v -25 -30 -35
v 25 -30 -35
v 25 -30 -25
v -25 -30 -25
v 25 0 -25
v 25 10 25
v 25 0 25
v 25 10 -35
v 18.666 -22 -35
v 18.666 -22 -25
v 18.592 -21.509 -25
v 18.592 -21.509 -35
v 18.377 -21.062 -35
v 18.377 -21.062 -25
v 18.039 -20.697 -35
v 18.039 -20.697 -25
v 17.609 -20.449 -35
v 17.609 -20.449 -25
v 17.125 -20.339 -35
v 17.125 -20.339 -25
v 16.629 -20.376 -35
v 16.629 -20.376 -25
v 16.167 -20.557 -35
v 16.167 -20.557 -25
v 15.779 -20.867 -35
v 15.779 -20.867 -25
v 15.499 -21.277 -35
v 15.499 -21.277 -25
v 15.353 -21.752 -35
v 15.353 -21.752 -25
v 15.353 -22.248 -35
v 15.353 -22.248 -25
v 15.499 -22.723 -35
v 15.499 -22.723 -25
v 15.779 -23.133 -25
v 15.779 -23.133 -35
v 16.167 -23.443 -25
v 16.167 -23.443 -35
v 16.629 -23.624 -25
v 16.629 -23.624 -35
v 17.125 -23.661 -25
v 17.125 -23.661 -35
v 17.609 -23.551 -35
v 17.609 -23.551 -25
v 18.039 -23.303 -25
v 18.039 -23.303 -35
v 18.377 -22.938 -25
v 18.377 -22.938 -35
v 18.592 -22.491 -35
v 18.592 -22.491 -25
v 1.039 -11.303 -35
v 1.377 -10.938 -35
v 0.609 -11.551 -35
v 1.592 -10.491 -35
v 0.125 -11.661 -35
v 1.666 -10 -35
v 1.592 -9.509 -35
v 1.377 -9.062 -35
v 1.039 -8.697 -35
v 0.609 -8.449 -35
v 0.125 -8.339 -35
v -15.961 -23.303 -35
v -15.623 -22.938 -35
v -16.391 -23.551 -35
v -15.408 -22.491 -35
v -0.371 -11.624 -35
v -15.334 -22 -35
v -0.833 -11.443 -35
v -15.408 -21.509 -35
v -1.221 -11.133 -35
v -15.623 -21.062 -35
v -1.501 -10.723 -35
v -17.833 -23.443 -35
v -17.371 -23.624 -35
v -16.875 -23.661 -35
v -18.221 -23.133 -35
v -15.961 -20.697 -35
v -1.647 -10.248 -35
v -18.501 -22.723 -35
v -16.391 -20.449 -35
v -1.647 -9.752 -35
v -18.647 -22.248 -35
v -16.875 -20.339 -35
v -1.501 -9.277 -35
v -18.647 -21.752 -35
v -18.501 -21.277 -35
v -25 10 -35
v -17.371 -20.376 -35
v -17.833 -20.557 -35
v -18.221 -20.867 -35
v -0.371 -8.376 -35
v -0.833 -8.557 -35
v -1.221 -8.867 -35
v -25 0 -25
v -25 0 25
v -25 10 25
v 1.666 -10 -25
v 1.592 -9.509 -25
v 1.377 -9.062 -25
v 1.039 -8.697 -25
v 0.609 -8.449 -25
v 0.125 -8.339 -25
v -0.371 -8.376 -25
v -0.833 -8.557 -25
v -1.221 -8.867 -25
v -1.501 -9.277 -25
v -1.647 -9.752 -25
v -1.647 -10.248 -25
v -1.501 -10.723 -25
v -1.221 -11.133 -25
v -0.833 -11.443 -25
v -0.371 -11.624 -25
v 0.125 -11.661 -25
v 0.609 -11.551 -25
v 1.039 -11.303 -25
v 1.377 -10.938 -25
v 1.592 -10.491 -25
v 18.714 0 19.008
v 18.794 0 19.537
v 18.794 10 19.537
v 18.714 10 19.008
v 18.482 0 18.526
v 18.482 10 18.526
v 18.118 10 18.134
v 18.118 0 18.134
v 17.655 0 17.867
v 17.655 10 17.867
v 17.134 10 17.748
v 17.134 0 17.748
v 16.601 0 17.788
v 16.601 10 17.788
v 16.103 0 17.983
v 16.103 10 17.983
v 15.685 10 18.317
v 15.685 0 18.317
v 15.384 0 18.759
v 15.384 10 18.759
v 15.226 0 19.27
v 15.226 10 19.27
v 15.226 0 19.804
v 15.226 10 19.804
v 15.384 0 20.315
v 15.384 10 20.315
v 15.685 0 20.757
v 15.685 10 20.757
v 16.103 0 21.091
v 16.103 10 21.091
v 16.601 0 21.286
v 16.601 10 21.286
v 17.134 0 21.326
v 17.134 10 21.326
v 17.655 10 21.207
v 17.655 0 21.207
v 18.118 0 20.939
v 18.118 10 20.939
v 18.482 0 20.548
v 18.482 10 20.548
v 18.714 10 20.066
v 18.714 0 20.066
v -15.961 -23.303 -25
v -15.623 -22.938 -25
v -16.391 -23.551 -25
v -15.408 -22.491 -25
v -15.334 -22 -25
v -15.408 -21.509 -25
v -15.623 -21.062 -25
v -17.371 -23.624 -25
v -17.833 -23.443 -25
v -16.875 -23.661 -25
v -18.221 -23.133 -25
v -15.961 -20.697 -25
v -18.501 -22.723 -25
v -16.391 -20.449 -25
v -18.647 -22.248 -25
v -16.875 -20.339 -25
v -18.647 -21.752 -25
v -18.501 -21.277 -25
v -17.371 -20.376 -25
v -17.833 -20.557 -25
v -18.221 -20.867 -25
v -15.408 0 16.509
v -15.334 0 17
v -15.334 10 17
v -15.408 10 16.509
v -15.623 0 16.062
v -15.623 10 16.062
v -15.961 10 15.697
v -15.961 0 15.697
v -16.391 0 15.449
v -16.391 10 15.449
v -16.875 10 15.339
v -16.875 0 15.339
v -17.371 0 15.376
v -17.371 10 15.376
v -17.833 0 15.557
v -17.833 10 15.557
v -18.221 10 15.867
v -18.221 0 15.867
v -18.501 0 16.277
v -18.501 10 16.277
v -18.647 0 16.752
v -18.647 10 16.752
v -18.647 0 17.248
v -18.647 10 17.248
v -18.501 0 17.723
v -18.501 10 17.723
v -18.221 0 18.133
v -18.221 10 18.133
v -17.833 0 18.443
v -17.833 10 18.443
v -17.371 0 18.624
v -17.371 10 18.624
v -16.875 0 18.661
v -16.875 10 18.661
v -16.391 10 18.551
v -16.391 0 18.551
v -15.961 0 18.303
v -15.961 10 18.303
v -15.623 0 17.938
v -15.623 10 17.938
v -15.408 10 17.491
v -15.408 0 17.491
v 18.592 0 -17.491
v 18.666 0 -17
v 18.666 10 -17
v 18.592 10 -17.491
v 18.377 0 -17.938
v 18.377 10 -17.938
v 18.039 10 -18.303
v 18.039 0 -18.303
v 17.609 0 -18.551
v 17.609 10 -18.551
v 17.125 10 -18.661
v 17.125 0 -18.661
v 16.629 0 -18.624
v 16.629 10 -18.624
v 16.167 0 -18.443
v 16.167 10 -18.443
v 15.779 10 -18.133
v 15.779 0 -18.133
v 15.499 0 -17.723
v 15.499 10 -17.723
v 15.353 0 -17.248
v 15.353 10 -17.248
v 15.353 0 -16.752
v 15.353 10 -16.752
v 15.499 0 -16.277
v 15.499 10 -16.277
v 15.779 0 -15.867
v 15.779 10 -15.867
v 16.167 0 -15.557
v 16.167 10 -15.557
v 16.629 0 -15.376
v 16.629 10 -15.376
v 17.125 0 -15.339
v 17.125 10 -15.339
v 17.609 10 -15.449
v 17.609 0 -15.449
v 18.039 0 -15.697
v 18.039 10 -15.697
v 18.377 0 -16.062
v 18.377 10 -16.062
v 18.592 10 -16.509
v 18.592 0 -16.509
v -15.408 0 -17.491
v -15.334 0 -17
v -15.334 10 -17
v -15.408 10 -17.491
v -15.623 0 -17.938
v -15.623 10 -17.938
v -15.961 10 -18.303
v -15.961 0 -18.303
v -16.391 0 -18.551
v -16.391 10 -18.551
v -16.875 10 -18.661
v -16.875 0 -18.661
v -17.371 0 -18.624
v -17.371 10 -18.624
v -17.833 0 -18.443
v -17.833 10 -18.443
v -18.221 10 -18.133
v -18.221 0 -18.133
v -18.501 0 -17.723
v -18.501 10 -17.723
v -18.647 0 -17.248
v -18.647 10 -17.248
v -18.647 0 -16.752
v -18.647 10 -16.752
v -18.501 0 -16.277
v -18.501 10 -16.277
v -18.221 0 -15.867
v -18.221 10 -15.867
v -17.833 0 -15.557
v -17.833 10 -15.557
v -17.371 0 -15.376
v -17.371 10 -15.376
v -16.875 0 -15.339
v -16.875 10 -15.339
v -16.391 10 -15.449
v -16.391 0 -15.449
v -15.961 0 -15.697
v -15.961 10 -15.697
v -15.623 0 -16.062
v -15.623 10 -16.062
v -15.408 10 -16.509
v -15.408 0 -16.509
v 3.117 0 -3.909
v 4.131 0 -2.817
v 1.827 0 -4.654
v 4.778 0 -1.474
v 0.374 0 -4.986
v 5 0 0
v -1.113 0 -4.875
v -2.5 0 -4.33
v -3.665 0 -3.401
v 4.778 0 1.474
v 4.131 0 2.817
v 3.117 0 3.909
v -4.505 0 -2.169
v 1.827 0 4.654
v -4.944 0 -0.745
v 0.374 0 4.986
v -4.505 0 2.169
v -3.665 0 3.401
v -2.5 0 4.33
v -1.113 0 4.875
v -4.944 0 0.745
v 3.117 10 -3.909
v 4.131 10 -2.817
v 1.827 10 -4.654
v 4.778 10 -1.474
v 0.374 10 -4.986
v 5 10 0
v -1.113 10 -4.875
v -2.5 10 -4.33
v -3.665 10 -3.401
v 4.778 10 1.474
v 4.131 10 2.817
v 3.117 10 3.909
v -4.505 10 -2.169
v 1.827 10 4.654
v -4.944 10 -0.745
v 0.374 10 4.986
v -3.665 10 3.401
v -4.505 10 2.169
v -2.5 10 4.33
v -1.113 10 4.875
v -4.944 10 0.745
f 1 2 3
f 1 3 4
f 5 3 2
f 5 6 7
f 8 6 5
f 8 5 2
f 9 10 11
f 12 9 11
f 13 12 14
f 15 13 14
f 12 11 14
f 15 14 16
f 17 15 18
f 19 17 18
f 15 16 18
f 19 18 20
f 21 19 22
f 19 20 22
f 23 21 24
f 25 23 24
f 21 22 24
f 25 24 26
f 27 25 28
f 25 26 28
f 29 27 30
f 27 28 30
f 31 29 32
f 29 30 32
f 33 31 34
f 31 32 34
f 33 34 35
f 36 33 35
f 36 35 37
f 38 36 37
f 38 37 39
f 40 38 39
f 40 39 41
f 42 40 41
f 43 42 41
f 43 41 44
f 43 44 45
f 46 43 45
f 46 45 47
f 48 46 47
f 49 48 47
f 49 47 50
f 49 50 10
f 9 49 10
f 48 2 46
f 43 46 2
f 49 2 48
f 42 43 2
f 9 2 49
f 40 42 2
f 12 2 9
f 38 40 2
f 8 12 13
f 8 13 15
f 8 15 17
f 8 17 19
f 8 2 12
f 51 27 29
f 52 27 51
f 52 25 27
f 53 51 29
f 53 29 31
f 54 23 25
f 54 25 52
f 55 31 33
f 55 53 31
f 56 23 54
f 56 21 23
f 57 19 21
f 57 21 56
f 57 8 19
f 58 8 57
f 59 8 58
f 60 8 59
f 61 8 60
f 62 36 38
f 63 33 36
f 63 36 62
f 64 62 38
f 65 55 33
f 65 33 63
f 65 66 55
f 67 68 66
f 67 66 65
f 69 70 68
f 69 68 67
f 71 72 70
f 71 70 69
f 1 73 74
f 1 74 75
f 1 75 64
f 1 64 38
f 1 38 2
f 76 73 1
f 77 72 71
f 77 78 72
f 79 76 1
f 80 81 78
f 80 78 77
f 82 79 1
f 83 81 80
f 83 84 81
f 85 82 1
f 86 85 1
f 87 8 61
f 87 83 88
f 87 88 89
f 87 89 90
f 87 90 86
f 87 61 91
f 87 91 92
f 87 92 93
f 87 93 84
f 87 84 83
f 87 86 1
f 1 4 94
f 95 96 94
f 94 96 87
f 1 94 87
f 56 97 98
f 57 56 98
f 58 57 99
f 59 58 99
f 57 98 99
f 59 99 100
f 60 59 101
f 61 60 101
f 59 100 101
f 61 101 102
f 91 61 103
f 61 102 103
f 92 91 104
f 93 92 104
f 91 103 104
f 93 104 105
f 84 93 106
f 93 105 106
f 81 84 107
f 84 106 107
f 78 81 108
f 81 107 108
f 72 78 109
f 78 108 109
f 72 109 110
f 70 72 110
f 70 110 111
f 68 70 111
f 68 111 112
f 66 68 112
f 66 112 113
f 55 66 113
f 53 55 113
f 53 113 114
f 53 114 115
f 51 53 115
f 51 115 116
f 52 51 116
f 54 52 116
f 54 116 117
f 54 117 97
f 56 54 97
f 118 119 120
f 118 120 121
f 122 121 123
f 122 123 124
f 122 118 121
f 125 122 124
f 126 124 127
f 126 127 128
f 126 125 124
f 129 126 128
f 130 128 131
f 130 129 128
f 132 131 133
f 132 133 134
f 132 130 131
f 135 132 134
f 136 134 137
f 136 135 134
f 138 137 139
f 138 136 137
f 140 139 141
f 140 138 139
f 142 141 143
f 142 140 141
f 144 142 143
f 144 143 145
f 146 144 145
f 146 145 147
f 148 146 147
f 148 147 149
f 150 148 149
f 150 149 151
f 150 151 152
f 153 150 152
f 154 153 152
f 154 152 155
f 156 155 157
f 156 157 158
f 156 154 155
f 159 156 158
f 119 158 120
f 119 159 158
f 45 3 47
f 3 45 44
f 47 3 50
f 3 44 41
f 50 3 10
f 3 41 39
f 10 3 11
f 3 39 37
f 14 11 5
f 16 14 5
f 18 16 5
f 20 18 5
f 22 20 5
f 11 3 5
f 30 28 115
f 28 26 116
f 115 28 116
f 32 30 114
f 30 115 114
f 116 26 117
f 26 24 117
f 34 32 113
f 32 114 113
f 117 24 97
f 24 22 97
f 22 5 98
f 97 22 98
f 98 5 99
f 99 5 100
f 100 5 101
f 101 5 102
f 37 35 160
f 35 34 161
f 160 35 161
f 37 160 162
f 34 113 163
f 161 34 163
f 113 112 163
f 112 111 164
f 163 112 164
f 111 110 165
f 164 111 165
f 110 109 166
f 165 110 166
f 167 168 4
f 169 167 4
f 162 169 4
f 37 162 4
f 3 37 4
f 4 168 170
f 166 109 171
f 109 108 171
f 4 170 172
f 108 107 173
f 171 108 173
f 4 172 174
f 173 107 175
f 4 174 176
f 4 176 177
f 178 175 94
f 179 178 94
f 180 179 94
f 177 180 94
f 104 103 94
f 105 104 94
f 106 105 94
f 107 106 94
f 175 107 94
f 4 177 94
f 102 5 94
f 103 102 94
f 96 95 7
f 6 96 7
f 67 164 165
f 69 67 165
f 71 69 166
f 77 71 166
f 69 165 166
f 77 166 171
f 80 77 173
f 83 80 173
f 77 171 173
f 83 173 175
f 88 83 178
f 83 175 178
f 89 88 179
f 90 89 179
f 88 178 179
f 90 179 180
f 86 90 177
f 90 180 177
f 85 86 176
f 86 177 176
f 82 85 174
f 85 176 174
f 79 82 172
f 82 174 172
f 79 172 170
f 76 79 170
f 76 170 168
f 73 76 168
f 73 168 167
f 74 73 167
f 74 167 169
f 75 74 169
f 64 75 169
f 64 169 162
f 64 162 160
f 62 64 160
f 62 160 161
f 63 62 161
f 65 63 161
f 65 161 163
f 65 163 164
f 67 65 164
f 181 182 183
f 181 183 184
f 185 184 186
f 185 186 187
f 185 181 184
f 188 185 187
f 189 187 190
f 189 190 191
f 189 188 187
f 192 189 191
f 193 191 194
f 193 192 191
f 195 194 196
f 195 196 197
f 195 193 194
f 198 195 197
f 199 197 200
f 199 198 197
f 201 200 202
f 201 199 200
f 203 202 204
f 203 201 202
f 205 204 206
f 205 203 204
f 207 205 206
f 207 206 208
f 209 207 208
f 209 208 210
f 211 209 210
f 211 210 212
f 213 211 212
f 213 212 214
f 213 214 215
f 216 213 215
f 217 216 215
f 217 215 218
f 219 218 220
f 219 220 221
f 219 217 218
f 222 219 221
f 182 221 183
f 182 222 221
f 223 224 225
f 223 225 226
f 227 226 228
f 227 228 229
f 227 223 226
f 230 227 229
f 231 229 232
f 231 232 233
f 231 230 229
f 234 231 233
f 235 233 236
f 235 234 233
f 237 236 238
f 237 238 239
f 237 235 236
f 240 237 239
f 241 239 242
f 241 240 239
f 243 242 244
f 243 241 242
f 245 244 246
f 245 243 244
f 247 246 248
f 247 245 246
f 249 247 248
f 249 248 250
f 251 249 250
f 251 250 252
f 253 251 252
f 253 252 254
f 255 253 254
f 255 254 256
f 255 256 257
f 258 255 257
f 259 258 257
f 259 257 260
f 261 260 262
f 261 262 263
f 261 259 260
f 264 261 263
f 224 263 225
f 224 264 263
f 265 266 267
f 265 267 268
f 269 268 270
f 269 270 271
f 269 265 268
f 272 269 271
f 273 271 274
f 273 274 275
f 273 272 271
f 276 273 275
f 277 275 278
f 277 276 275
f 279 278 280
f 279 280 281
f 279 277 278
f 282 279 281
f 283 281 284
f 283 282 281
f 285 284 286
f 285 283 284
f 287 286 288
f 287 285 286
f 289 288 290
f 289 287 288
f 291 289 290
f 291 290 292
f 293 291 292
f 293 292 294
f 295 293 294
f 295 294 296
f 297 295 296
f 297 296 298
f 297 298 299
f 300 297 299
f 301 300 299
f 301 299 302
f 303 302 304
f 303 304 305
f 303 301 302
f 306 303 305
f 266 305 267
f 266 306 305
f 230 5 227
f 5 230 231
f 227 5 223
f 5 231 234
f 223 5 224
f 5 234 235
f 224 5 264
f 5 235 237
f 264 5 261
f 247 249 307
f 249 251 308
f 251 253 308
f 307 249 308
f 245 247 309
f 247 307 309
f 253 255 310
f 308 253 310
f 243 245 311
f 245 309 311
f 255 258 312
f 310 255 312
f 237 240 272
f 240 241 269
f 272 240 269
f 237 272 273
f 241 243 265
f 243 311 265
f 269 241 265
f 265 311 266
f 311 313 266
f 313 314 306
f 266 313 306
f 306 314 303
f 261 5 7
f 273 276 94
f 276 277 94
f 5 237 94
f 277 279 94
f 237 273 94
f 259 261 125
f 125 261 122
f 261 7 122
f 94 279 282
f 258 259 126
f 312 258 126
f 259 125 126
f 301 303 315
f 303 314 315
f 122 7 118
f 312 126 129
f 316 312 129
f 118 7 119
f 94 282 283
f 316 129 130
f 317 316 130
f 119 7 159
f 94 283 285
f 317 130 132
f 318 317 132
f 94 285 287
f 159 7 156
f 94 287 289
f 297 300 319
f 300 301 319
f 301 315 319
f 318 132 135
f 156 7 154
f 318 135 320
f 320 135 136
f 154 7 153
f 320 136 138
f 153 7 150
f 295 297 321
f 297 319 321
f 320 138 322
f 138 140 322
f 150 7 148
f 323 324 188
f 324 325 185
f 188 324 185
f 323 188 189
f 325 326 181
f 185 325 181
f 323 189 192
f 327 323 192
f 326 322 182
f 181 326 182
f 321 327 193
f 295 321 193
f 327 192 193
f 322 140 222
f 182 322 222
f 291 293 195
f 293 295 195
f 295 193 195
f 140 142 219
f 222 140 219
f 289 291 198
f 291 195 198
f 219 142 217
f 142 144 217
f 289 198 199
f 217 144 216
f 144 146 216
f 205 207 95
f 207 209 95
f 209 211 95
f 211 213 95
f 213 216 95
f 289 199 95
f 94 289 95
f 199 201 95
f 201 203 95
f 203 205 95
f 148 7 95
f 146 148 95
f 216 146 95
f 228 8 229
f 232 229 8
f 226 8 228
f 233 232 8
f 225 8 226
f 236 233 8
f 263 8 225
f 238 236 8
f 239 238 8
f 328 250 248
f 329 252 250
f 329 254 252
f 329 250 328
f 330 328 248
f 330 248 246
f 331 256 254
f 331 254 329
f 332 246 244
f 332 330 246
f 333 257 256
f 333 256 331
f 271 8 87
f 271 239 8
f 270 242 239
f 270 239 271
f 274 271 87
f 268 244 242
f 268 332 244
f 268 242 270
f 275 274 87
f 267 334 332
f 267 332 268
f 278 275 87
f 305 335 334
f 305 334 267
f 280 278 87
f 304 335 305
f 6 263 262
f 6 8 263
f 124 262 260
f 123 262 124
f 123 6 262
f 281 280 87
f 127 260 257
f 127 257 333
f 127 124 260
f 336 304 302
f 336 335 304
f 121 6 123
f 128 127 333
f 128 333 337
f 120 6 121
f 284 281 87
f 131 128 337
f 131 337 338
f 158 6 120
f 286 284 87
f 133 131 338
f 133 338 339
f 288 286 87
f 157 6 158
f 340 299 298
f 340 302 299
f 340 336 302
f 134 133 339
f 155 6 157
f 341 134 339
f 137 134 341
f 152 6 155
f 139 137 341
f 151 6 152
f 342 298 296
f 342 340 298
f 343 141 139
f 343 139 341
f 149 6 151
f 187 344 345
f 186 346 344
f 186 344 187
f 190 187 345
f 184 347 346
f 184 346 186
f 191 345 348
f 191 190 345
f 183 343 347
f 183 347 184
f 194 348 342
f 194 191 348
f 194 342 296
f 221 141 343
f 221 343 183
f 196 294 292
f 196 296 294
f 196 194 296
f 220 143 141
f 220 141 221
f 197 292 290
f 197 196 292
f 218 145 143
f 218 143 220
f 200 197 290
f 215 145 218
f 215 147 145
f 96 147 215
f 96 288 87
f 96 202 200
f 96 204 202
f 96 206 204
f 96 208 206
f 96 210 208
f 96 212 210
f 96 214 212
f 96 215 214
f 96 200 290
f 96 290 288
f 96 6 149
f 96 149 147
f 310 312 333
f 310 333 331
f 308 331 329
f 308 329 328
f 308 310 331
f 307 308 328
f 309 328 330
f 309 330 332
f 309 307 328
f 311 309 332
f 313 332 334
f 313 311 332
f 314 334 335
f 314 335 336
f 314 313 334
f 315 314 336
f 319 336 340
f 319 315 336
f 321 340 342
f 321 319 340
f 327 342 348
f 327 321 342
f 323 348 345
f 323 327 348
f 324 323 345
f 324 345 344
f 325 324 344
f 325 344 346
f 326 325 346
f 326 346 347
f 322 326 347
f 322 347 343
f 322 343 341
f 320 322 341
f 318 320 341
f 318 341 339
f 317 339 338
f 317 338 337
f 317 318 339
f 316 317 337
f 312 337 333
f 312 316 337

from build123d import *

# Parameters (mm, degrees)
SKETCH1_W           = 50
SKETCH1_H           = 50
SKETCH1_R           = 5
SKETCH1_R_2         = 1.666
SKETCH1_R_3         = 1.793902259
BOSS_EXTRUDE3_DEPTH = 10
SKETCH2_W           = 50
SKETCH2_H           = 10
BOSS_EXTRUDE4_DEPTH = 10
SKETCH3_W           = 50
SKETCH3_H           = 10
BOSS_EXTRUDE5_DEPTH = 30
SKETCH4_R           = 1.666
CUT_EXTRUDE1_DEPTH  = 30


with BuildPart() as part:
    # Sketch1 → Boss-Extrude3 (new body)
    with BuildSketch(Plane(origin=(0, 0, 0), x_dir=(1, 0, 0), z_dir=(0, 1, 0))):
        Rectangle(SKETCH1_W, SKETCH1_H)
        Circle(SKETCH1_R, mode=Mode.SUBTRACT)
        with Locations((-17, 17)):
            Circle(SKETCH1_R_2, mode=Mode.SUBTRACT)
        with Locations((17, 17)):
            Circle(SKETCH1_R_2, mode=Mode.SUBTRACT)
        with Locations((-17, -17)):
            Circle(SKETCH1_R_2, mode=Mode.SUBTRACT)
        with Locations((17, -19.536960904)):
            Circle(SKETCH1_R_3, mode=Mode.SUBTRACT)
    extrude(amount=BOSS_EXTRUDE3_DEPTH)

    # Sketch2 → Boss-Extrude4 (add)
    with BuildSketch(Plane(origin=(0, 0, -25), x_dir=(-1, 0, 0), z_dir=(0, 0, -1))):
        with Locations((0, 5)):
            Rectangle(SKETCH2_W, SKETCH2_H)
    extrude(amount=BOSS_EXTRUDE4_DEPTH)

    # Sketch3 → Boss-Extrude5 (add)
    with BuildSketch(Plane(origin=(0, 0, 0), x_dir=(-1, 0, 0), z_dir=(0, -1, 0))):
        with Locations((0, 30)):
            Rectangle(SKETCH3_W, SKETCH3_H)
    extrude(amount=BOSS_EXTRUDE5_DEPTH)

    # Sketch4 → Cut-Extrude1 (cut)
    with BuildSketch(Plane.XY.offset(-25)):
        with Locations((17, -22)):
            Circle(SKETCH4_R)
        with Locations((0, -10)):
            Circle(SKETCH4_R)
        with Locations((-17, -22)):
            Circle(SKETCH4_R)
    extrude(amount=-CUT_EXTRUDE1_DEPTH, mode=Mode.SUBTRACT)


solid = part.part
